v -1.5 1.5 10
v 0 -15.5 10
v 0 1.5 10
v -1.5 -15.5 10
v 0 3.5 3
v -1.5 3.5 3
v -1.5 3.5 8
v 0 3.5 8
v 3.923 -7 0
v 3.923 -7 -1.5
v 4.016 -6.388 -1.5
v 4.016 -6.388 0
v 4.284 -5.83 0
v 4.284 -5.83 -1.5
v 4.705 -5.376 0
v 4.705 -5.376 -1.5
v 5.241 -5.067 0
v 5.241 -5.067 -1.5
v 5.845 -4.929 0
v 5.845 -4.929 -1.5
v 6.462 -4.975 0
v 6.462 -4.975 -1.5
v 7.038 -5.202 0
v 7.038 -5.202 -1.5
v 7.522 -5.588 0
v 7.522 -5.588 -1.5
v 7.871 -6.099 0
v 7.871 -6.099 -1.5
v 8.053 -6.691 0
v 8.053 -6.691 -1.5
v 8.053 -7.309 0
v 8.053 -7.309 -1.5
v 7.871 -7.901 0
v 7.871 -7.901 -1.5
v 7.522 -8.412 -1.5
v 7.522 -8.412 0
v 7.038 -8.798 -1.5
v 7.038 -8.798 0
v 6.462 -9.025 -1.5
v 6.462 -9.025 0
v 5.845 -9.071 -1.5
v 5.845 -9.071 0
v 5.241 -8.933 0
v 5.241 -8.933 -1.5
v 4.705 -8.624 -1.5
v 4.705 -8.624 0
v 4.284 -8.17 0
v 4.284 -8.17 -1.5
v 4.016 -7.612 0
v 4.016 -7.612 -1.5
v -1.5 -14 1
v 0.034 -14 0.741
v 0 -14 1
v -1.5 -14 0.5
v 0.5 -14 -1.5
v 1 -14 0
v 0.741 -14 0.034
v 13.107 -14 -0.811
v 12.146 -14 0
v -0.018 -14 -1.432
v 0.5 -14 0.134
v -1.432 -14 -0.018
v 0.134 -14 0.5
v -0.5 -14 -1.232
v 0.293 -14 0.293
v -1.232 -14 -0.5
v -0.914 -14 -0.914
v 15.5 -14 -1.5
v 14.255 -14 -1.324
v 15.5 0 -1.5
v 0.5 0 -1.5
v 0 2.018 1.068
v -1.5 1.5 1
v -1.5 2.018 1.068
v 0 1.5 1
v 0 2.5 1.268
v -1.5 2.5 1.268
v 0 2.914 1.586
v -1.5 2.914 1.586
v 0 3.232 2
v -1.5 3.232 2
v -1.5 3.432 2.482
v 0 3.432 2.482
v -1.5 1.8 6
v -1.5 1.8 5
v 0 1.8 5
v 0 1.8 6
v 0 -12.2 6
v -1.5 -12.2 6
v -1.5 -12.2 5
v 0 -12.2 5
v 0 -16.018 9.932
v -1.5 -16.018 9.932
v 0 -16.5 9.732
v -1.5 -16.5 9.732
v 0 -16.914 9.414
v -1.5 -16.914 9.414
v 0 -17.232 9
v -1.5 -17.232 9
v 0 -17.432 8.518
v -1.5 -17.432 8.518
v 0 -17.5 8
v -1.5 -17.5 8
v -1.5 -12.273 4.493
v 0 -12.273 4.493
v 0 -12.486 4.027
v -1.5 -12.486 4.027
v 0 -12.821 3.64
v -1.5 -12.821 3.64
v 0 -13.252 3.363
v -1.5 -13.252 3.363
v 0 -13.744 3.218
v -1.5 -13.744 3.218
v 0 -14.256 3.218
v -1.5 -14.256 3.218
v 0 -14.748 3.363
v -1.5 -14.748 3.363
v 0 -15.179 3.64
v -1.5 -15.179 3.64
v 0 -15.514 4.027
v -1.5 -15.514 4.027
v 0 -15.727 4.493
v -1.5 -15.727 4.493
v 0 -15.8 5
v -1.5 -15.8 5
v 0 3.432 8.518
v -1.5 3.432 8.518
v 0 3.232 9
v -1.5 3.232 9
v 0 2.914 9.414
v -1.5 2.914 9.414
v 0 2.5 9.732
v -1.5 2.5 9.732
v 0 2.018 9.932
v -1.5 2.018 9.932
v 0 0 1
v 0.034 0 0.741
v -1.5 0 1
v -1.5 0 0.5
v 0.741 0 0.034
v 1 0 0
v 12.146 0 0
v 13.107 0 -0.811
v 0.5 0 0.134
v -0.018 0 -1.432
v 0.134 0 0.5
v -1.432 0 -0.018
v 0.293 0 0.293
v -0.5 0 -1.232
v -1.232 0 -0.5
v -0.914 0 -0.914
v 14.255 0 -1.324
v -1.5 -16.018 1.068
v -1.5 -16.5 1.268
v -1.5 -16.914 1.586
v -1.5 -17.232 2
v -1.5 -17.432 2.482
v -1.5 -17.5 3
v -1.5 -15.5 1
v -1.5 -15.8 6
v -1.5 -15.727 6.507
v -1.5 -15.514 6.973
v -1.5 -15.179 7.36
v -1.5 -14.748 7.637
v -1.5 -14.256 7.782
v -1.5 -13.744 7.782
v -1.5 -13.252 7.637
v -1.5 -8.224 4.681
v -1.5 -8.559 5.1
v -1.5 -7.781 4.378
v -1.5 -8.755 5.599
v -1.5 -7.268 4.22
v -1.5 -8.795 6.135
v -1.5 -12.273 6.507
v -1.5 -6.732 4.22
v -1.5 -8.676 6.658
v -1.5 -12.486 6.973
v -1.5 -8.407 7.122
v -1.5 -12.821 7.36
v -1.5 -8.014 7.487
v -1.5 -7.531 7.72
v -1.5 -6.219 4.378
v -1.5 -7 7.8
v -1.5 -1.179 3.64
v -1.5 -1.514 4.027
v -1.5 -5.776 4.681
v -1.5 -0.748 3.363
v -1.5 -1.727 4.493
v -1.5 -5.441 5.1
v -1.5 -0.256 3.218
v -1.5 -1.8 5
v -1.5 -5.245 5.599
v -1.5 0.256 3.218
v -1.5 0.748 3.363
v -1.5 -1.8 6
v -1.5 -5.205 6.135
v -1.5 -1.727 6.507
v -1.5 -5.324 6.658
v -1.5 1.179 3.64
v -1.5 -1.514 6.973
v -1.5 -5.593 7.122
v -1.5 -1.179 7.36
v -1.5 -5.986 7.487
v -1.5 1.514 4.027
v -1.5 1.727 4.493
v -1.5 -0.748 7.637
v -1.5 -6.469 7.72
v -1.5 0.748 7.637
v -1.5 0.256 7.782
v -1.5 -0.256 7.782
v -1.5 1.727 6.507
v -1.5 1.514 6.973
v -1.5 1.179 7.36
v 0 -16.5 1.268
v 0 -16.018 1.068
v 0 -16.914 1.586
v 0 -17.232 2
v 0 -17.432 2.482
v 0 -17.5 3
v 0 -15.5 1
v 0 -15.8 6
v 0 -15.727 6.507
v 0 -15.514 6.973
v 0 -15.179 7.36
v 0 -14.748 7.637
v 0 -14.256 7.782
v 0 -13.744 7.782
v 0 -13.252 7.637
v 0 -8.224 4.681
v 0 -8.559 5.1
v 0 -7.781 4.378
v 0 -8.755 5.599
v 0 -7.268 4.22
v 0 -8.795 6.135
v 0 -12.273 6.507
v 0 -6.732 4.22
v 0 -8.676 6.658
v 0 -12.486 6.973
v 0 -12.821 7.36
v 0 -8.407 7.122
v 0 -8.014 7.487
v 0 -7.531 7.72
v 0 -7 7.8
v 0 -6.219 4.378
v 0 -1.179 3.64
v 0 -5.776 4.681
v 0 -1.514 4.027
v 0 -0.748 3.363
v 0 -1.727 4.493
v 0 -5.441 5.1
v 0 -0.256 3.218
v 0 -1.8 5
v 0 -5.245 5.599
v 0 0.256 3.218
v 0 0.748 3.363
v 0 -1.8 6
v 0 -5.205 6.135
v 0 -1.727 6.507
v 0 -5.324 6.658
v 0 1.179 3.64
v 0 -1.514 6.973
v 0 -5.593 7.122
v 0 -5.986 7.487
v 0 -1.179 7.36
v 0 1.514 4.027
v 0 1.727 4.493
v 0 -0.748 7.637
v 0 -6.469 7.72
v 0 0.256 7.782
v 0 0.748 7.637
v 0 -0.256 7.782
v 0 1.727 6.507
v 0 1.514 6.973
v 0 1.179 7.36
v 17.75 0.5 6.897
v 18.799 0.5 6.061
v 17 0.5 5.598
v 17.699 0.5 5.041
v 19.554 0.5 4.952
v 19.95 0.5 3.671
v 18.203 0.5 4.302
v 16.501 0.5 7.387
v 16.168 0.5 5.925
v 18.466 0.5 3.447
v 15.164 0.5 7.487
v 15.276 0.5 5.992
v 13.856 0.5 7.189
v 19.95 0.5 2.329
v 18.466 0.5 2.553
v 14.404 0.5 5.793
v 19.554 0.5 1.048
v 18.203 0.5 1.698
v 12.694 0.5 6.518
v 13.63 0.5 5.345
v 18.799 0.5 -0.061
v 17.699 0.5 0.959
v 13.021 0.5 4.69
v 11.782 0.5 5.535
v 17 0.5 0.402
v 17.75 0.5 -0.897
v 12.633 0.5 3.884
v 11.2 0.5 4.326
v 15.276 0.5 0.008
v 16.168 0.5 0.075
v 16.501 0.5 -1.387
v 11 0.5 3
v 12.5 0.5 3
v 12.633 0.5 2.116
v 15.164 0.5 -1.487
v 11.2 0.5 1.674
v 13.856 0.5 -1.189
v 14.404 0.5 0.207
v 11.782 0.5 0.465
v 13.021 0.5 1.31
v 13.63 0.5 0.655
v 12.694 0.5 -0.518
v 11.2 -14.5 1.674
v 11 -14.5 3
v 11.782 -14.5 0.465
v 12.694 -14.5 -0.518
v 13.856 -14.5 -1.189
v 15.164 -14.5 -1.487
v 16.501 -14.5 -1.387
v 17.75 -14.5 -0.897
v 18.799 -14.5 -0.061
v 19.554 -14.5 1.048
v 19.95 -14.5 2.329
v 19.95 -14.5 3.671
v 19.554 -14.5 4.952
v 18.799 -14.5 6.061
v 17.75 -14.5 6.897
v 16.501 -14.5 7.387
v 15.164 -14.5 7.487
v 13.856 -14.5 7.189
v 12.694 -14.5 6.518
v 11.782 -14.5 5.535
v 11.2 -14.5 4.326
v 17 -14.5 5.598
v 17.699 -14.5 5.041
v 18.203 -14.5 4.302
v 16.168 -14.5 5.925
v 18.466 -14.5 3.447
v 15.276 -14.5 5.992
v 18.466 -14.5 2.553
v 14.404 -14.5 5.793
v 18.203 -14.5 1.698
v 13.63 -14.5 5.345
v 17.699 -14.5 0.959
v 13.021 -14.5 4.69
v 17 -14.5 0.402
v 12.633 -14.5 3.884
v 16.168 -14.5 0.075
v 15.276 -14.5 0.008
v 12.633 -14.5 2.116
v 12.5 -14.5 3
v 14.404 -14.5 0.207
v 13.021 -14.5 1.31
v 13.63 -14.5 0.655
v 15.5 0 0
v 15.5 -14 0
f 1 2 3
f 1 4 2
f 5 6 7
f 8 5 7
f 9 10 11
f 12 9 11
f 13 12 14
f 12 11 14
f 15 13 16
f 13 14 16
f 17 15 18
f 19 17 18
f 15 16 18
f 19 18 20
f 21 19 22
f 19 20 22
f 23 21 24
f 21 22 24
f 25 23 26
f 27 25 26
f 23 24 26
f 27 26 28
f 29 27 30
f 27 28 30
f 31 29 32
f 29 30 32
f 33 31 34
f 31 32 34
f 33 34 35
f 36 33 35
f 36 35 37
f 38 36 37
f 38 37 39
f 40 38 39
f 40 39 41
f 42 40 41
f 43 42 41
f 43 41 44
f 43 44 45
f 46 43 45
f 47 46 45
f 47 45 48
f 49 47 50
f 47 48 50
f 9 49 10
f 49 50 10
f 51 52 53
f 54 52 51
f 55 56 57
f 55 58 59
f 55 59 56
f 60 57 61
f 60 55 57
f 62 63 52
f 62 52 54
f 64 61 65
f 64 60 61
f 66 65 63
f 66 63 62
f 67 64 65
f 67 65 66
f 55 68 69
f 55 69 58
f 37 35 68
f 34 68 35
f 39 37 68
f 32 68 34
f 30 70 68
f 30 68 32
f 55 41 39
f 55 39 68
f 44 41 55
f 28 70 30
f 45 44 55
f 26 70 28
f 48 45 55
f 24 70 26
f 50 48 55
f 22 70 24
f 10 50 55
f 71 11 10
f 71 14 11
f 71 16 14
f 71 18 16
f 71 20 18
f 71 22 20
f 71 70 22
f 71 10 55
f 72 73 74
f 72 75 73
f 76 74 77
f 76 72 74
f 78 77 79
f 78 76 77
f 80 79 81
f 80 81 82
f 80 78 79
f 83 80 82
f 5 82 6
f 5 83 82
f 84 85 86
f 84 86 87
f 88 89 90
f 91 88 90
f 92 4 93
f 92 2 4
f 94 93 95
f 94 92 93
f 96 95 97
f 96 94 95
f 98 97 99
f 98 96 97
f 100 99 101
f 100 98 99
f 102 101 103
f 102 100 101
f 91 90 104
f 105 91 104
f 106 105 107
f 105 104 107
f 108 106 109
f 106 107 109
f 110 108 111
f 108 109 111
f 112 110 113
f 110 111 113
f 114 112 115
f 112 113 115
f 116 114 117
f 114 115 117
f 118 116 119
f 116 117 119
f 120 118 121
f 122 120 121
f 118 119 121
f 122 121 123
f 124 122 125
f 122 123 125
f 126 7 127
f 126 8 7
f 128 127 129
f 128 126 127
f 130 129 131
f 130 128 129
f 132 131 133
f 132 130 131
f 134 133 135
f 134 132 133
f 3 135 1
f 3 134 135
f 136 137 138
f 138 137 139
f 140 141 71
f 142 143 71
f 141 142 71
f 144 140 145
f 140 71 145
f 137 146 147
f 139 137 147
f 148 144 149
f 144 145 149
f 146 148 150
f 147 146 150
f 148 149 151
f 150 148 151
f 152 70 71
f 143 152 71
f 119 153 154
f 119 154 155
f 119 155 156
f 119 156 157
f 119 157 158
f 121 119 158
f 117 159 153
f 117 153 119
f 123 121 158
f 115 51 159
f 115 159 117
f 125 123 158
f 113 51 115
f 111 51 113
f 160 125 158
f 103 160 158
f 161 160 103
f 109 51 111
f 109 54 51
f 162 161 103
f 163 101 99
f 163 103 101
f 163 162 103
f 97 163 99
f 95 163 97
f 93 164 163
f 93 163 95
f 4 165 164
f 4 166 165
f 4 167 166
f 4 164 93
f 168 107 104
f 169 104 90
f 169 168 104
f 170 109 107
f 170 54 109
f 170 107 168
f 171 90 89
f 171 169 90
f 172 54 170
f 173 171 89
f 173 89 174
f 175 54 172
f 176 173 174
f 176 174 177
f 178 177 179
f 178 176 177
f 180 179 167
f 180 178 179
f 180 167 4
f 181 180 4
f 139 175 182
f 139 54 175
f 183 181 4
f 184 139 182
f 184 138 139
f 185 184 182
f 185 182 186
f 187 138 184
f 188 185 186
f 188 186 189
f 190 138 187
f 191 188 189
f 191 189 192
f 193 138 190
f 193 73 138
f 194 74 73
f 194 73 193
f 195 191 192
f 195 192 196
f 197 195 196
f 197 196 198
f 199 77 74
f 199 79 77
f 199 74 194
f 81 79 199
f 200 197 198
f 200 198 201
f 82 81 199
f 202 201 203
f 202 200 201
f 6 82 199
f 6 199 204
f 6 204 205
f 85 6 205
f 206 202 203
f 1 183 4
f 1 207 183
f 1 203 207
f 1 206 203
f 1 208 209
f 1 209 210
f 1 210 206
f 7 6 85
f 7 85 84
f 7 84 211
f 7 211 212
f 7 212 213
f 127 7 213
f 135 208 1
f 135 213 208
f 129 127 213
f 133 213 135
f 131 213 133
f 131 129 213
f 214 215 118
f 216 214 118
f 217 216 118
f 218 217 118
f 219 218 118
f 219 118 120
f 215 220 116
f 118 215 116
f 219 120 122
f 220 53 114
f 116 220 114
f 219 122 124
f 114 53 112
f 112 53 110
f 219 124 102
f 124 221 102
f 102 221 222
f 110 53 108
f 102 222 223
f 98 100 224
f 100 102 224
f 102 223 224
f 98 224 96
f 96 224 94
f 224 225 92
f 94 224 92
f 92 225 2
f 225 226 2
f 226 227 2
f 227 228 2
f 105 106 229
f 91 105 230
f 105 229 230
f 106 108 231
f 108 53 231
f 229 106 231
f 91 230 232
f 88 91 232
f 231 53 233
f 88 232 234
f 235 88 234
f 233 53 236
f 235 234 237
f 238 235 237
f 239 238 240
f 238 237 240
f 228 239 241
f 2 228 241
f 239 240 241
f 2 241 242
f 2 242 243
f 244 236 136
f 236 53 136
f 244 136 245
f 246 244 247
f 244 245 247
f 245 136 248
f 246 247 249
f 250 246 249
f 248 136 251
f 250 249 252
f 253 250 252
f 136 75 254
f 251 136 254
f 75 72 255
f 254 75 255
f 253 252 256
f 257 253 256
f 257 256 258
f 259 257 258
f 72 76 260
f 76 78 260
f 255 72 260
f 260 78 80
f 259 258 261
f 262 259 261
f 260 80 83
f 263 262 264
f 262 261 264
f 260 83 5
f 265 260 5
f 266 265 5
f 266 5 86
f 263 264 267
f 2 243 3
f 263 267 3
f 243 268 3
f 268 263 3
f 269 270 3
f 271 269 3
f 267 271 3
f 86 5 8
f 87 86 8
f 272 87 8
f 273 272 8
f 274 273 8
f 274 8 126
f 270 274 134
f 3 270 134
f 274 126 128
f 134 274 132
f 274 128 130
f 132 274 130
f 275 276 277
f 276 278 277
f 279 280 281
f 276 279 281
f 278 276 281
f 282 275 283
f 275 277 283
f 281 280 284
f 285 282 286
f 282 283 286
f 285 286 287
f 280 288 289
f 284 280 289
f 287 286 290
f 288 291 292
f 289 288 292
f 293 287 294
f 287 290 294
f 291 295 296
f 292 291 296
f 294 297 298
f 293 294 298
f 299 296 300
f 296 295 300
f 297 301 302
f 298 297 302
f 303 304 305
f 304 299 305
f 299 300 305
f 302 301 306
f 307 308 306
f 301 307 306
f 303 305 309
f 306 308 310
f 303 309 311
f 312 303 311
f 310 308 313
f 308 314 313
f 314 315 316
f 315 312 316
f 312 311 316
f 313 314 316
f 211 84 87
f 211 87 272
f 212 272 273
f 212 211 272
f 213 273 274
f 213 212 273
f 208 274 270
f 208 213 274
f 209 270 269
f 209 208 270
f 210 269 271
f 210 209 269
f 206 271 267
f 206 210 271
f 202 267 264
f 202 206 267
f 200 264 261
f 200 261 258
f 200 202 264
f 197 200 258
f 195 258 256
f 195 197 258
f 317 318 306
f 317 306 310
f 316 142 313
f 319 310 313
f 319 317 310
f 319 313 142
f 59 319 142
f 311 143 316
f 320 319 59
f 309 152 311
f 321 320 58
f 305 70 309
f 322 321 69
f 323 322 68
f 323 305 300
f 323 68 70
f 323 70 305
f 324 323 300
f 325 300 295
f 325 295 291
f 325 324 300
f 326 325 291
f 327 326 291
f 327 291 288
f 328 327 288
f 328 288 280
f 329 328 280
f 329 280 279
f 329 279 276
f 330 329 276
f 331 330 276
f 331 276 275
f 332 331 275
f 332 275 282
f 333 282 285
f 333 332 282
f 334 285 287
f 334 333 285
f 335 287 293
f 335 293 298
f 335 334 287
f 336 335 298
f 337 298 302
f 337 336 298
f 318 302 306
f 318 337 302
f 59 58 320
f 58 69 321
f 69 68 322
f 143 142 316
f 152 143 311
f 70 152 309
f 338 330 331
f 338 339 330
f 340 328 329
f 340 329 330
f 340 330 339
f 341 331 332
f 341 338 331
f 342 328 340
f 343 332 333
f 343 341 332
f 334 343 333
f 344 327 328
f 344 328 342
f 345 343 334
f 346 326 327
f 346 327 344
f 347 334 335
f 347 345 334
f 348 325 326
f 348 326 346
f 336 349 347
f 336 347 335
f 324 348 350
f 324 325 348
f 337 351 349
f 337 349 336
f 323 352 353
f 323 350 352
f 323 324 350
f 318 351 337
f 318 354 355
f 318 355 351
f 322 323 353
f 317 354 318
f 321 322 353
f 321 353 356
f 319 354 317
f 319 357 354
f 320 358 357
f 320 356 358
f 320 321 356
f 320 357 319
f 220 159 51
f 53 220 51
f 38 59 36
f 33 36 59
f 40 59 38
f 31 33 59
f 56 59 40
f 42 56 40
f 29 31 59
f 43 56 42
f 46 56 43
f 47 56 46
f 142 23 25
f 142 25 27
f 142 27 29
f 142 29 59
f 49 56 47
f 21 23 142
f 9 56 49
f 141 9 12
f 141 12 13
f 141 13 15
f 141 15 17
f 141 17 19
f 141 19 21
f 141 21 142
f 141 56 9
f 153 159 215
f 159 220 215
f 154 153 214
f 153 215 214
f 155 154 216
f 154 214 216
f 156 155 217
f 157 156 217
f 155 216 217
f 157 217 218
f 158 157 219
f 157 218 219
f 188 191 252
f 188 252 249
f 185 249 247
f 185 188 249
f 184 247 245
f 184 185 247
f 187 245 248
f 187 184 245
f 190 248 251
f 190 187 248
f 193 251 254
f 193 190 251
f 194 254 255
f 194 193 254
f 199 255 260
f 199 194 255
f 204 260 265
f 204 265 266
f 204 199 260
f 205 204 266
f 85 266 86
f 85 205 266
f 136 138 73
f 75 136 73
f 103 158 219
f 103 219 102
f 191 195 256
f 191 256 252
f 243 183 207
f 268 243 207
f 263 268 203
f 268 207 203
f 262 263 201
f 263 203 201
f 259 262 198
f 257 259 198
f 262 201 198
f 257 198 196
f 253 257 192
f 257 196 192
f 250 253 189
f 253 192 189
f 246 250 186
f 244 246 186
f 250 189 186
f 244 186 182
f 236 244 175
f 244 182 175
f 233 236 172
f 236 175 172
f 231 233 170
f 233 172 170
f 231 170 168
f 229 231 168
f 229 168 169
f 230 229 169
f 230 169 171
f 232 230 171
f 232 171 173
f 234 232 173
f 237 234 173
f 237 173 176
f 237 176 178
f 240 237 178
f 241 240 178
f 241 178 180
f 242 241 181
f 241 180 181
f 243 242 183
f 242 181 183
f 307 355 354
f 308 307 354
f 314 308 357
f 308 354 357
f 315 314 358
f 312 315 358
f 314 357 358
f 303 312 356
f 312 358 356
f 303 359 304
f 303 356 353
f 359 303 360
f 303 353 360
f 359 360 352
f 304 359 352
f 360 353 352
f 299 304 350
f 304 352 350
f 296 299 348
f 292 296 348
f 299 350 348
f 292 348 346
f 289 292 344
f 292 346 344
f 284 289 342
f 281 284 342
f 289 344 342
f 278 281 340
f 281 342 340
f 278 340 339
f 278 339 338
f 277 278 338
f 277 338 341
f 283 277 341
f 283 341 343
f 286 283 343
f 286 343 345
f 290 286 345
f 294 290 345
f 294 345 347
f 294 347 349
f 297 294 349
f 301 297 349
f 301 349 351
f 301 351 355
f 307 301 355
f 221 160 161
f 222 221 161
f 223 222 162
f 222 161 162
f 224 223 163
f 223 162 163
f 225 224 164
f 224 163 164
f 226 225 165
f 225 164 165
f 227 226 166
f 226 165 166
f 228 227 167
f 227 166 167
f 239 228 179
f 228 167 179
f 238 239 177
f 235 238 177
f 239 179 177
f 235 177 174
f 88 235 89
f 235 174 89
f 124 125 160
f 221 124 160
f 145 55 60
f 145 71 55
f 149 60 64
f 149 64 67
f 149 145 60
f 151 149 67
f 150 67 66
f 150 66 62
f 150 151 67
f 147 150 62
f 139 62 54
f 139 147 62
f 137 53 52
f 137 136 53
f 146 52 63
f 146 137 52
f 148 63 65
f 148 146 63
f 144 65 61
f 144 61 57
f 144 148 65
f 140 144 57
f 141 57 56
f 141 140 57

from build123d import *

# Parameters (mm, degrees)
SKETCH_1_W             = 11
SKETCH_1_H             = 14
SM_BASE_FLANGE_1_DEPTH = 1.5
SKETCH_9_R             = 4.5
SKETCH_9_R_2           = 3
EXTRUDE_1_DEPTH        = 15
SKETCH_10_W            = 1.5
SKETCH_10_H            = 14
EXTRUDE_1_2_DEPTH      = 4.5
SKETCH_11_W            = 1.5
SKETCH_11_H            = 14
EXTRUDE_2_DEPTH        = 11.5
FILLET_2_R             = 2
FILLET_3_R             = 1
SKETCH_12_W            = 9
SKETCH_12_H            = 3.5
EXTRUDE_3_DEPTH        = 1.5
FILLET_4_R             = 2
SKETCH_13_R            = 1.8
CUT_EXTRUDE_1_DEPTH    = 1.5
SKETCH_14_R            = 2.076590198
CUT_EXTRUDE_2_DEPTH    = 1.5


# Sheet-metal steps are written as plain solids
with BuildPart() as part:
    # Sketch 1 → Базовая кромка1 (new body)
    with BuildSketch(Plane.XY):
        with Locations((5.5, -7)):
            Rectangle(SKETCH_1_W, SKETCH_1_H)
    extrude(amount=-SM_BASE_FLANGE_1_DEPTH)



with BuildPart() as body_2:
    # Эскиз9 → Extrude 1 (new body)
    with BuildSketch(Plane(origin=(0, -14.5, 0), x_dir=(-1, 0, 0), z_dir=(0, -1, 0))):
        with Locations((-15.5, -3)):
            Circle(SKETCH_9_R)
        with Locations((-15.5, -3)):
            Circle(SKETCH_9_R_2, mode=Mode.SUBTRACT)
    extrude(amount=-EXTRUDE_1_DEPTH)


with BuildPart() as part_1:
    add(part.part)

    add(body_2.part)  # Extrude 1 2 merges body 2
    # Эскиз10 → Extrude 1 2 (add)
    with BuildSketch(Plane(origin=(11, 0, 0), x_dir=(0, 0, -1), z_dir=(1, 0, 0))):
        with Locations((0.75, -7)):
            Rectangle(SKETCH_10_W, SKETCH_10_H)
    extrude(amount=EXTRUDE_1_2_DEPTH)

    # Эскиз11 → Бобышка-Вытянуть2 (add)
    with BuildSketch(Plane(origin=(0, 0, -1.5), x_dir=(-1, 0, 0), z_dir=(0, 0, -1))):
        with Locations((0.75, -7)):
            Rectangle(SKETCH_11_W, SKETCH_11_H)
    extrude(amount=-EXTRUDE_2_DEPTH)

    # Скругление2
    fillet_2_edges = [part_1.edges().sort_by_distance(p)[0] for p in [
        (-1.5, -7, -1.5),
    ]]
    fillet(fillet_2_edges, radius=FILLET_2_R)

    # Скругление3
    fillet_3_edges = [part_1.edges().sort_by_distance(p)[0] for p in [
        (0, -7, 0),
    ]]
    fillet(fillet_3_edges, radius=FILLET_3_R)

    # Эскиз12 → Бобышка-Вытянуть3 (add)
    with BuildSketch(Plane.ZY.offset(1.5)):
        with Locations((5.5, -15.75)):
            Rectangle(SKETCH_12_W, SKETCH_12_H)
        with Locations((5.5, 1.75)):
            Rectangle(SKETCH_12_W, SKETCH_12_H)
    extrude(amount=-EXTRUDE_3_DEPTH)

    # Скругление4
    fillet_4_edges = [part_1.edges().sort_by_distance(p)[0] for p in [
        (-0.75, -17.5, 10),
        (-0.75, -17.5, 1),
        (-0.75, 3.5, 10),
        (-0.75, 3.5, 1),
    ]]
    fillet(fillet_4_edges, radius=FILLET_4_R)

    # Эскиз13 → Вырез-Вытянуть1 (cut)
    with BuildSketch(Plane.ZY.offset(1.5)):
        with Locations((6, -7)):
            Circle(SKETCH_13_R)
        with BuildLine():
            Line((5, 1.8), (6, 1.8))
            ThreePointArc((6, 1.8), (7.8, 0), (6, -1.8))
            Line((6, -1.8), (5, -1.8))
            ThreePointArc((5, -1.8), (3.2, 0), (5, 1.8))
        make_face()
        with BuildLine():
            Line((5, -15.8), (6, -15.8))
            ThreePointArc((6, -15.8), (7.8, -14), (6, -12.2))
            Line((6, -12.2), (5, -12.2))
            ThreePointArc((5, -12.2), (3.2, -14), (5, -15.8))
        make_face()
    extrude(amount=-CUT_EXTRUDE_1_DEPTH, mode=Mode.SUBTRACT)

    # Эскиз14 → Вырез-Вытянуть2 (cut)
    with BuildSketch(Plane(origin=(0, 0, -1.5), x_dir=(-1, 0, 0), z_dir=(0, 0, -1))):
        with Locations((-6, -7)):
            Circle(SKETCH_14_R)
    extrude(amount=-CUT_EXTRUDE_2_DEPTH, mode=Mode.SUBTRACT)


solid = part_1.part
